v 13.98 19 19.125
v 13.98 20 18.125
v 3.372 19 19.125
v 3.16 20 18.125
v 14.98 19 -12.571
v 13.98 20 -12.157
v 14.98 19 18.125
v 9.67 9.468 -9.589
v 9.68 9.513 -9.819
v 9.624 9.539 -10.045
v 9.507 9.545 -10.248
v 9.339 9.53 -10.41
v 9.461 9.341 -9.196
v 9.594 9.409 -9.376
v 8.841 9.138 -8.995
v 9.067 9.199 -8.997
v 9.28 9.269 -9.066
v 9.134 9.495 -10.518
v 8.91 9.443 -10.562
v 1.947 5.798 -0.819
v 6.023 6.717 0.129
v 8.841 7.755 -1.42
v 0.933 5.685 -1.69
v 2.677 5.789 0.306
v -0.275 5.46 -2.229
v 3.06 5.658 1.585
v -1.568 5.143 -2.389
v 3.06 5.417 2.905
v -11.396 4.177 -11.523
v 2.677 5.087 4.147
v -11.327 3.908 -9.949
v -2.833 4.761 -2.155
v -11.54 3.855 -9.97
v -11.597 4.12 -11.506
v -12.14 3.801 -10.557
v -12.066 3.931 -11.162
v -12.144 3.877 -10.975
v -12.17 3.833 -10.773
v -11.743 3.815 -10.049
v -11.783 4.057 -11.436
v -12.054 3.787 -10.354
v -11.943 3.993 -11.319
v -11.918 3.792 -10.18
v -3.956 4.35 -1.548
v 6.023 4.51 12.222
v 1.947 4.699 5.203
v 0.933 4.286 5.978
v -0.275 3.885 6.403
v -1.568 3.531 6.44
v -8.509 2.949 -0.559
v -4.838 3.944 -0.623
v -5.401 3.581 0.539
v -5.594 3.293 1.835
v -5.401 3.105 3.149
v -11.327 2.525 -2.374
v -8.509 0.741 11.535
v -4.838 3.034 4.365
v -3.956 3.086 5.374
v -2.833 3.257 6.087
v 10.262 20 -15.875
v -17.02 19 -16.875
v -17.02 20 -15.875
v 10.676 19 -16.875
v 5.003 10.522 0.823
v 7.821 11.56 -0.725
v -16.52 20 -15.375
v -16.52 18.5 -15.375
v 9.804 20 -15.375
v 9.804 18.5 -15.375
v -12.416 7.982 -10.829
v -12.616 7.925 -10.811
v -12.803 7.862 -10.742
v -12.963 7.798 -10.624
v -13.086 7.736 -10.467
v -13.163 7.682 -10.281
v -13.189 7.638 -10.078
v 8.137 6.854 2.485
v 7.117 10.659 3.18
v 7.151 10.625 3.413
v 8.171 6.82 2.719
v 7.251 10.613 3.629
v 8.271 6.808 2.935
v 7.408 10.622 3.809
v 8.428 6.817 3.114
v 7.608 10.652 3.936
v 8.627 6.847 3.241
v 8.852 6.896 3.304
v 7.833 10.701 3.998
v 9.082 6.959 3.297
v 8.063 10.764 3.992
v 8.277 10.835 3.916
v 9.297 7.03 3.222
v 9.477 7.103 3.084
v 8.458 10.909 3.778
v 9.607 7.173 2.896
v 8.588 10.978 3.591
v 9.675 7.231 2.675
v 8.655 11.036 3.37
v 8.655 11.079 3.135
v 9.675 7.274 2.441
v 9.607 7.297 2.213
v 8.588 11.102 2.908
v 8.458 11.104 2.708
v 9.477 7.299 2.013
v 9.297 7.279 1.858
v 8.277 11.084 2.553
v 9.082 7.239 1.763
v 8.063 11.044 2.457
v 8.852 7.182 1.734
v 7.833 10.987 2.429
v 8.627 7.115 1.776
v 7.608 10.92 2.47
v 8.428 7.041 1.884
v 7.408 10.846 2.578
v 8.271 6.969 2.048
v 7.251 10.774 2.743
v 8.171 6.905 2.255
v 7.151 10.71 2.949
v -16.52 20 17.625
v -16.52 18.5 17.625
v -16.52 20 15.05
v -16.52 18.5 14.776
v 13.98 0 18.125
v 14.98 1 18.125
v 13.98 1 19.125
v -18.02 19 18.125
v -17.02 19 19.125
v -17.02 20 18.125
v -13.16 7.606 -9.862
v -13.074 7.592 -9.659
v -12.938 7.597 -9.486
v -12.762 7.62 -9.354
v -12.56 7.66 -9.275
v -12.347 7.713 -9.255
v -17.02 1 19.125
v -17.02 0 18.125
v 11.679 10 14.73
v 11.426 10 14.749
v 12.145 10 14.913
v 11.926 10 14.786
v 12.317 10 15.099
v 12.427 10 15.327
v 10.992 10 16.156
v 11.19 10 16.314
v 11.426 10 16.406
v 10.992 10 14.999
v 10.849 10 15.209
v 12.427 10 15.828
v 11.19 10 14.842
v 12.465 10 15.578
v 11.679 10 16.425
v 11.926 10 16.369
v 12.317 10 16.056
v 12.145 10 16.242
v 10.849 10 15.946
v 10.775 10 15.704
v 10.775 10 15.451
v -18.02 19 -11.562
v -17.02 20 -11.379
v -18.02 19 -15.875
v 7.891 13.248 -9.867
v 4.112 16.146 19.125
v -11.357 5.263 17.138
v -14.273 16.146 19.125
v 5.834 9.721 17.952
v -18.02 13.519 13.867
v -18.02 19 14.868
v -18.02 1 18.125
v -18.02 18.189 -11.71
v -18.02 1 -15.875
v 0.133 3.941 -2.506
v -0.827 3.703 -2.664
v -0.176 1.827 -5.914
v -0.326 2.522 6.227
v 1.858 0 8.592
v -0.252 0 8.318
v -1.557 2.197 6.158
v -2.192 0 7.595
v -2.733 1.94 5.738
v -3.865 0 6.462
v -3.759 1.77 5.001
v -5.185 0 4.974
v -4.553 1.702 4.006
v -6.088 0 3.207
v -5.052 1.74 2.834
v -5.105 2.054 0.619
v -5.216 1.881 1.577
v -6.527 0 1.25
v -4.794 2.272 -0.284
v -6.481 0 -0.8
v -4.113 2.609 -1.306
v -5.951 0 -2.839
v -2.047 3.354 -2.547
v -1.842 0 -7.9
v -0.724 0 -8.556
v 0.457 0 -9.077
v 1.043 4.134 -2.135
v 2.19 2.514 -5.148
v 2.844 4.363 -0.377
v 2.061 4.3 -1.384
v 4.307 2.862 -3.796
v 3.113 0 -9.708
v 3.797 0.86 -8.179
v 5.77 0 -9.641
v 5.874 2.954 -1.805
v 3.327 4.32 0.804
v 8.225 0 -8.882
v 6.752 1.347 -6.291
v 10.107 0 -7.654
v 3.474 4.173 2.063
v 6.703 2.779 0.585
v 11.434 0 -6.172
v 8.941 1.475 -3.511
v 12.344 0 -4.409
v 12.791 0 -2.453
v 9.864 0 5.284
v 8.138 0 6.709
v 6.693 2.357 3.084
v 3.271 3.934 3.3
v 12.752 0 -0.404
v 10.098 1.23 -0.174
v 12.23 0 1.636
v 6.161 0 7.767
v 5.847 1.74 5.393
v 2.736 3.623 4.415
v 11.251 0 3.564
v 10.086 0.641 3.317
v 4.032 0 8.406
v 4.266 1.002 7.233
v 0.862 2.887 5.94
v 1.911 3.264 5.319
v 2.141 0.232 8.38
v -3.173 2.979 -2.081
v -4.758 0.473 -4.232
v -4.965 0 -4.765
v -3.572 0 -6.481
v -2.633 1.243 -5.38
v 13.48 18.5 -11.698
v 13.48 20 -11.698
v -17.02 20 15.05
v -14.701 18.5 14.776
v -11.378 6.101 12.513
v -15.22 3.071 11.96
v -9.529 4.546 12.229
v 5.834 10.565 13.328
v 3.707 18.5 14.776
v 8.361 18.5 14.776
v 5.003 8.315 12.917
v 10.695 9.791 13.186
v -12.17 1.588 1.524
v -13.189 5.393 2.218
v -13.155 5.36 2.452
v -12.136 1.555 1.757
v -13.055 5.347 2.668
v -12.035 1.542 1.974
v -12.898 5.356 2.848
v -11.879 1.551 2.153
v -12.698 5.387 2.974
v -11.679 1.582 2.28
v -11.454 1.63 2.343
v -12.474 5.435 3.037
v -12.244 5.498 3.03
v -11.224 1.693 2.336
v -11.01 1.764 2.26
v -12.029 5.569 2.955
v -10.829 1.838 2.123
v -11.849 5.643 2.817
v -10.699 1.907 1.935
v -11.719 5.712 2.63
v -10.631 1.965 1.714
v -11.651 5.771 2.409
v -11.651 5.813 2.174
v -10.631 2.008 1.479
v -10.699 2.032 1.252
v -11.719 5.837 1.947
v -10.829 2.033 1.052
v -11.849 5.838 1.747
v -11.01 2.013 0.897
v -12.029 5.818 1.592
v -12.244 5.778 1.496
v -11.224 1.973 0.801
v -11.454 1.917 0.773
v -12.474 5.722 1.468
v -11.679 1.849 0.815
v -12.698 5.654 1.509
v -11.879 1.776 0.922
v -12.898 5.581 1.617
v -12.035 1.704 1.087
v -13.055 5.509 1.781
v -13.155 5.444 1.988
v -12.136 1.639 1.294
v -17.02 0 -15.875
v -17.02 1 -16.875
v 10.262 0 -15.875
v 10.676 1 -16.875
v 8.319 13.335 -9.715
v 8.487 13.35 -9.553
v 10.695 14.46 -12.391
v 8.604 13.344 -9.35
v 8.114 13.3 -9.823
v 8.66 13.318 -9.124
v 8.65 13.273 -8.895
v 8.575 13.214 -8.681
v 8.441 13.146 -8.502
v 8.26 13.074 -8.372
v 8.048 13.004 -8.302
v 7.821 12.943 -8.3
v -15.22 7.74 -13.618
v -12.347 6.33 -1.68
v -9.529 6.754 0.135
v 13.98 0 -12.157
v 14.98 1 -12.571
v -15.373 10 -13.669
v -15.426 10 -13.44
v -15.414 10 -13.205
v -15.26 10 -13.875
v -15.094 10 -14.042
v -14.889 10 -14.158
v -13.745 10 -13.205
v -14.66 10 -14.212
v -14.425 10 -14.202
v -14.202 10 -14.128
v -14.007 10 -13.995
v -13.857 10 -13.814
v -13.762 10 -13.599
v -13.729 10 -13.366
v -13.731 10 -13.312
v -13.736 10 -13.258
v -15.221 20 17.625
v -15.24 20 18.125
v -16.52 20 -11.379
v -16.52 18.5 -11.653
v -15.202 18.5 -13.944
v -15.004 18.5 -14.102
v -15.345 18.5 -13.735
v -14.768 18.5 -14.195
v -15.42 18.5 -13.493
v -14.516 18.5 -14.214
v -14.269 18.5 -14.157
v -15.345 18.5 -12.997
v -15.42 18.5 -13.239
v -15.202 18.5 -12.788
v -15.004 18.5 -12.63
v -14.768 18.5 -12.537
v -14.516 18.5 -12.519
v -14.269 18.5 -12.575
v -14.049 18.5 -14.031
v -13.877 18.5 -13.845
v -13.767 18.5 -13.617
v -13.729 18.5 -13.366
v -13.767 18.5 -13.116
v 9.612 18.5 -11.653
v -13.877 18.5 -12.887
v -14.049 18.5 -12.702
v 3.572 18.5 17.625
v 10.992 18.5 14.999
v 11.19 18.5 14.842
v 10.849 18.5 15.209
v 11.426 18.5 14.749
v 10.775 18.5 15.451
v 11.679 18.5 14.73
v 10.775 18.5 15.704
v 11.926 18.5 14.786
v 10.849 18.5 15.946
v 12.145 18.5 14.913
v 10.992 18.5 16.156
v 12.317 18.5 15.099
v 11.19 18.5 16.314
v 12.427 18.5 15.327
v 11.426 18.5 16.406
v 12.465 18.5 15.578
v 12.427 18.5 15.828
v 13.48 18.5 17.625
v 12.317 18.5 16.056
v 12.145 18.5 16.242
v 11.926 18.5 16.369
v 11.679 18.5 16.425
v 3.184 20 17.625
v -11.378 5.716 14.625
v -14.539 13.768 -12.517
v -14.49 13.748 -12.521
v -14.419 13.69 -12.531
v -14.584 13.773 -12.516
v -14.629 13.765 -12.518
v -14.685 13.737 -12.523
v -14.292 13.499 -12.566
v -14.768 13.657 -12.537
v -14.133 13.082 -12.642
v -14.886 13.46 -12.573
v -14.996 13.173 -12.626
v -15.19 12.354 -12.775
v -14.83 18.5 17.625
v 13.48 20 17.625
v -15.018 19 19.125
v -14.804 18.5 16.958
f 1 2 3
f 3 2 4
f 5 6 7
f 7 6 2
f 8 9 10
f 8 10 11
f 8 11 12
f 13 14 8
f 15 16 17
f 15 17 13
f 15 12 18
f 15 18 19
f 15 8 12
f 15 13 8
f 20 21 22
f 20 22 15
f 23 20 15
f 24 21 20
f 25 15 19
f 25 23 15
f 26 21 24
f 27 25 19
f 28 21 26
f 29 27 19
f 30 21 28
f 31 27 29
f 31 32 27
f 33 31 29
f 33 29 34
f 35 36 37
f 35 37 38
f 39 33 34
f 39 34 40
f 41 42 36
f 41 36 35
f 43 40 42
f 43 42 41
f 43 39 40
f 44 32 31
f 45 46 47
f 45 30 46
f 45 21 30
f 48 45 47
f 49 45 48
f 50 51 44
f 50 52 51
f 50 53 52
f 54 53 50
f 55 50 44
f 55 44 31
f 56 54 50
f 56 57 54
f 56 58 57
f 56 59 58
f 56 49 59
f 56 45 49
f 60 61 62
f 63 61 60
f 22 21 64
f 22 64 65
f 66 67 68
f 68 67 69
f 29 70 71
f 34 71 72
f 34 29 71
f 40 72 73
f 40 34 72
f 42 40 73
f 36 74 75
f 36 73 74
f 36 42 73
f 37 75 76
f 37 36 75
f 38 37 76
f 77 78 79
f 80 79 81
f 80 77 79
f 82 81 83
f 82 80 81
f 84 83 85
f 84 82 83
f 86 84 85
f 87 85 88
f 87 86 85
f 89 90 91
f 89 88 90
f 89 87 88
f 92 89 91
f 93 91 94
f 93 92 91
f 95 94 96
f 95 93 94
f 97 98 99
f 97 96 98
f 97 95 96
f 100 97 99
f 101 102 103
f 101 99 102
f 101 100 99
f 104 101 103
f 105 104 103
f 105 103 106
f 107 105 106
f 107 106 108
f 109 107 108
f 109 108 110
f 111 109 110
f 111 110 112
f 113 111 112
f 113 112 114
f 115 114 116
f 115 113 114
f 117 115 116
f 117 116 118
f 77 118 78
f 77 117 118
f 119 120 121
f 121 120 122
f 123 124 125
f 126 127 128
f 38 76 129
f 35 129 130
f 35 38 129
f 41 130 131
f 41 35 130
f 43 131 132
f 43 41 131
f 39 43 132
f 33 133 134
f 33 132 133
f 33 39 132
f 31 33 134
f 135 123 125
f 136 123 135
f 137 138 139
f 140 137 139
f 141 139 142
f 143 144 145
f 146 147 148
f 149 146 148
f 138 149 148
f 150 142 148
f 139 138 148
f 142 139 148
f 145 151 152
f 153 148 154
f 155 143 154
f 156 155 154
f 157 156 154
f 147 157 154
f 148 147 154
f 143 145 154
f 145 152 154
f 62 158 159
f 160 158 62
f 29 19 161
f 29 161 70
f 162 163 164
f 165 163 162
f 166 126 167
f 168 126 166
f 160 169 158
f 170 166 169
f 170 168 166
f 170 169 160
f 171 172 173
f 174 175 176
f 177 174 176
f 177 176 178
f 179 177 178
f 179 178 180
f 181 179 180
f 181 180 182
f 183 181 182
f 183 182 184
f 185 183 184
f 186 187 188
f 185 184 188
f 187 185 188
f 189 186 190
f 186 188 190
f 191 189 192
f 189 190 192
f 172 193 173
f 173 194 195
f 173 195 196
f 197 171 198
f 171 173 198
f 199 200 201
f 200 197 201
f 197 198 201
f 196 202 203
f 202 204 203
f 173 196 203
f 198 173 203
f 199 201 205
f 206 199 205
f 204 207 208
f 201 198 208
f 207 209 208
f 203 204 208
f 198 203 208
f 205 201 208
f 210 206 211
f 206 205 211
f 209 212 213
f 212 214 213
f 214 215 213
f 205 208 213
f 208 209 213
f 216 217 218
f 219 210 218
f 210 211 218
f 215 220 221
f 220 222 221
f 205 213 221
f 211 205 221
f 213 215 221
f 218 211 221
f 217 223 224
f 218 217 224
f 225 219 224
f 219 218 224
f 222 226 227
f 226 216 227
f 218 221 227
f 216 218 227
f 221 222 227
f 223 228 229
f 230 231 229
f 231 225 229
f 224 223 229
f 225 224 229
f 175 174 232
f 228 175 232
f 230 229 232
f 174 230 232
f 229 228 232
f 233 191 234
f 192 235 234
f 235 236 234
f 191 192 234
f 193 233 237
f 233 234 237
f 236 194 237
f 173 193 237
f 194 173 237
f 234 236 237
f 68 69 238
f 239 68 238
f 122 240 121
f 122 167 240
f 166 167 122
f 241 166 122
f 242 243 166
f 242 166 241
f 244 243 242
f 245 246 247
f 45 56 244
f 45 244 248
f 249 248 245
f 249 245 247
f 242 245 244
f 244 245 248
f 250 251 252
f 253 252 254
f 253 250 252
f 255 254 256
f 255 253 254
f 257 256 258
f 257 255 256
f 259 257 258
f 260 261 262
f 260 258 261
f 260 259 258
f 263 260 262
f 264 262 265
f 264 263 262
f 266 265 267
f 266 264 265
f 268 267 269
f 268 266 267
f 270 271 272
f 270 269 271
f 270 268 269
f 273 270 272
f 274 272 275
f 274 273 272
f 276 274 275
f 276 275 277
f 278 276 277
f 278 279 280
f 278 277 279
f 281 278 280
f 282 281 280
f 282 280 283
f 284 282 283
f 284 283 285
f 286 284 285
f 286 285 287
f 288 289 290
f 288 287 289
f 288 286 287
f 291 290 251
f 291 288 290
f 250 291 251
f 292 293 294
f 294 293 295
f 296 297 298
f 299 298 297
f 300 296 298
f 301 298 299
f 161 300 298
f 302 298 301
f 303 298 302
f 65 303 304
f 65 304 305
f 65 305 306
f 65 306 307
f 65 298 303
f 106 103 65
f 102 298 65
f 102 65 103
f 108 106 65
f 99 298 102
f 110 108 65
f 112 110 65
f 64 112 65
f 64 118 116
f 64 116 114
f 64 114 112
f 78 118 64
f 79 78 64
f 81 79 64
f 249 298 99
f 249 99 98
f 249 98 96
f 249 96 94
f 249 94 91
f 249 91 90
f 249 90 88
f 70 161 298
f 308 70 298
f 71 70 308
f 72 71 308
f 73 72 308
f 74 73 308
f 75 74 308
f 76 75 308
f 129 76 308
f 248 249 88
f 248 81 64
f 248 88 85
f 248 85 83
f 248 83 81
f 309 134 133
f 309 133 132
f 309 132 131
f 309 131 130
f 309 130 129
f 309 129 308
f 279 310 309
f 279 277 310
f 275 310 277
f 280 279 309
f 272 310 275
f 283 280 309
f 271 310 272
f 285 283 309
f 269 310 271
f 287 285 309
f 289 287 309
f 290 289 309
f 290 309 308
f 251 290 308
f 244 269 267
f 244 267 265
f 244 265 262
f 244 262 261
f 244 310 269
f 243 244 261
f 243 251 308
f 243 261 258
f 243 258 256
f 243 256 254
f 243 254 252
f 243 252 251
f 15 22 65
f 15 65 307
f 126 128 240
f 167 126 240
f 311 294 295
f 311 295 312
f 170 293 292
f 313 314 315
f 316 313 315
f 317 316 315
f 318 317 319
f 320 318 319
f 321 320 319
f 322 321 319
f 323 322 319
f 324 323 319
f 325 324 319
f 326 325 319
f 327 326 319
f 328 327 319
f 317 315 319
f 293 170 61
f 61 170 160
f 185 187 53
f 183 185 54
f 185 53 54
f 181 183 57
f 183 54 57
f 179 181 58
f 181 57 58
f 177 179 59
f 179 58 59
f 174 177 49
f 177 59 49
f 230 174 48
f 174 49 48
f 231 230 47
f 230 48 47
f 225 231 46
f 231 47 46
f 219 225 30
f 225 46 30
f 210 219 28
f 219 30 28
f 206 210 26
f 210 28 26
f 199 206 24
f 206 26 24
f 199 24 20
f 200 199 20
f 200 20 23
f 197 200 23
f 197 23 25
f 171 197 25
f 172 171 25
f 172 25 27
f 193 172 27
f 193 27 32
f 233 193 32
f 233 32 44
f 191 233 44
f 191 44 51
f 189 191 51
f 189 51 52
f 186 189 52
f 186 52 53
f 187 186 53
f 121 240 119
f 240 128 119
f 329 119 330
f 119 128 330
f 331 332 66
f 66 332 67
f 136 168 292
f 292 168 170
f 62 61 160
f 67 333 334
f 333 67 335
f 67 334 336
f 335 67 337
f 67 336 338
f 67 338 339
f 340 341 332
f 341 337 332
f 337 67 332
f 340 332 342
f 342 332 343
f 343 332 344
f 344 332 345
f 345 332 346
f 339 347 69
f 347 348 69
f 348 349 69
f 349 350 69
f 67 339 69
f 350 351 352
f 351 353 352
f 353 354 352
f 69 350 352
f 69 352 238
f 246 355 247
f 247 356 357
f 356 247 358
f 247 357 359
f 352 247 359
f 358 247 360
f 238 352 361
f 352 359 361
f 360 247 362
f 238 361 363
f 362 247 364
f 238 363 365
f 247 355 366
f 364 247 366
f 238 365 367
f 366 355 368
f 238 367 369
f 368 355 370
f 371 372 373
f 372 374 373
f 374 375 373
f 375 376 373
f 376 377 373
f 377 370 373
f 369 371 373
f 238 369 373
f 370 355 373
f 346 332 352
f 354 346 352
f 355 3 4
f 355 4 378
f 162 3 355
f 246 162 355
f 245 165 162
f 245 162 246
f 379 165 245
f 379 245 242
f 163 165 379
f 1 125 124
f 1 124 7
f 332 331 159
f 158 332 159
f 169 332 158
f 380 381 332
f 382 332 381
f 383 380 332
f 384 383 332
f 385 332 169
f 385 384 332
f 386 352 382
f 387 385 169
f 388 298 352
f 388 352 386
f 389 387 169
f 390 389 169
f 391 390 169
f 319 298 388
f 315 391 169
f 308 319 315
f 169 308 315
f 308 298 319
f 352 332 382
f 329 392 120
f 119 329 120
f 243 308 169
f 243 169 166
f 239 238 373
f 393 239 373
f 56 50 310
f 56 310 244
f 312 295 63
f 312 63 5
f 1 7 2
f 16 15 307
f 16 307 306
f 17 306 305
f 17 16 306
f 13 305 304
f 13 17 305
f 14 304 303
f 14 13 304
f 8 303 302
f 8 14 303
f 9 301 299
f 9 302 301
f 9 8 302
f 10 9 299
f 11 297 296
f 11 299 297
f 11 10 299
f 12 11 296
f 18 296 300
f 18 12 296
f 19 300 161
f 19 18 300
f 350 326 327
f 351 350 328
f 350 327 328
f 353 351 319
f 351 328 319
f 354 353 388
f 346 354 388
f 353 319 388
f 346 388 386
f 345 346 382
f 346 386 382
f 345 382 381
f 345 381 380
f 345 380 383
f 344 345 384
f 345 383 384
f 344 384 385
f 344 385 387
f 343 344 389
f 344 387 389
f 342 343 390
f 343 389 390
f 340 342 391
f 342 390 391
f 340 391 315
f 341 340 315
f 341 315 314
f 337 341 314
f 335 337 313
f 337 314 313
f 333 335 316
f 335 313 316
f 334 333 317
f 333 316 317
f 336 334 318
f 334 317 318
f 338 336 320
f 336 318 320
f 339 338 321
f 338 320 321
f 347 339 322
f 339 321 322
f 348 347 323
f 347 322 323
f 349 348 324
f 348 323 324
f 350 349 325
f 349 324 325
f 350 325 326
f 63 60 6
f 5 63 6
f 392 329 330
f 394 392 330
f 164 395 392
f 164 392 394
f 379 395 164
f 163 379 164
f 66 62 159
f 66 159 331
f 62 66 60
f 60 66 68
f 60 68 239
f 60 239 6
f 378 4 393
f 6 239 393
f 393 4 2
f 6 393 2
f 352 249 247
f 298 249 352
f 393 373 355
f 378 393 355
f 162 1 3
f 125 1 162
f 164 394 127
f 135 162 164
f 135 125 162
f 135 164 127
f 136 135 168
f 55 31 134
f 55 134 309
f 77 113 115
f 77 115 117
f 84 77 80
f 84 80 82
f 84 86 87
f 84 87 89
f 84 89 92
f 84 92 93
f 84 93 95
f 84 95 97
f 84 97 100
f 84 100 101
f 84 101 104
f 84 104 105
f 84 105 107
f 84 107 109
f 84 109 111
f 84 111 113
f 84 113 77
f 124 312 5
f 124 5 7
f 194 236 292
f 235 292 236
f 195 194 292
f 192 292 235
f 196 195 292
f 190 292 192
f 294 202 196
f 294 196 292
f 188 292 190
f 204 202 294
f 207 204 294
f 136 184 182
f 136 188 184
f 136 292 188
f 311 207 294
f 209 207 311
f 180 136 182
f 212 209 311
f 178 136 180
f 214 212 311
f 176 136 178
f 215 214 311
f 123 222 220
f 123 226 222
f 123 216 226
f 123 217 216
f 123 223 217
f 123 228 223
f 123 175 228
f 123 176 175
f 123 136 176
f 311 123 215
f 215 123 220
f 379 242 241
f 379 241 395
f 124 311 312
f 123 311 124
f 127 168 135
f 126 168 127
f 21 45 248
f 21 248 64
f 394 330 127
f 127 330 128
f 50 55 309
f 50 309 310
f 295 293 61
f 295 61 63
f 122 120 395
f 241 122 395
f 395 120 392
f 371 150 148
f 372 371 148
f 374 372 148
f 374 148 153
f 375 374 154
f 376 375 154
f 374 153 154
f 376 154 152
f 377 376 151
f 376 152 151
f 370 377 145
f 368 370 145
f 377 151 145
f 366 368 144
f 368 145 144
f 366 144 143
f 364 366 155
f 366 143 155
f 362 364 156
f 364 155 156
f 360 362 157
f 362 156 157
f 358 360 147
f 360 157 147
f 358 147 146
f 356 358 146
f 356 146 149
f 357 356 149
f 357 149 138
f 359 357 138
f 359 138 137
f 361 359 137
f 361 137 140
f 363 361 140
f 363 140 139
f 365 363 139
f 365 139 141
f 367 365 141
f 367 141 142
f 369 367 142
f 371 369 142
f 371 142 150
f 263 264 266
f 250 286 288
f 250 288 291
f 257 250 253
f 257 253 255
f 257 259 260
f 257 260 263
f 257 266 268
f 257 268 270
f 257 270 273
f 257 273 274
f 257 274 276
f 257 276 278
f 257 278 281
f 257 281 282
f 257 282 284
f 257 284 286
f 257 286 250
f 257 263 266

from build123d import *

# Parameters (mm, degrees)
F3_R      = 0.85
F4_DEPTH  = 20
F2_R      = 4.5
F5_DEPTH  = 50
F6_START  = 4
F2_R_2    = 0.8
F6_DEPTH  = 21
F7_DEPTH  = 25
F8_START  = 6
F8_DEPTH  = 19
F9_START  = 6
F9_DEPTH  = 19
F13_SIZE  = 1
F14_START = -18.5
F14_DEPTH = 6.5
F15_START = -10
F15_DEPTH = 15


with BuildPart() as f4:
    # F3 (on Front) → F4 (new body)
    with BuildSketch(Plane.XZ):
        Polygon((14.9801738807, -12.5709681619), (14.9801738807, 19.1251428629), (-18.0198261193, 19.1251428629), (-18.0198261193, -16.8748571371), (10.6762849054, -16.8748571371), align=None)
        Polygon((-16.5198261193, 17.6251428629), (13.4801738807, 17.6251428629), (13.4801738807, -11.6982692705), (9.803586014, -15.3748571371), (-16.5198261193, -15.3748571371), align=None, mode=Mode.SUBTRACT)
        Polygon((13.4801738807, -11.6982692705), (13.4801738807, 17.6251428629), (-16.5198261193, 17.6251428629), (-16.5198261193, -15.3748571371), (9.803586014, -15.3748571371), align=None)
        with Locations((-14.5791273393, -13.3661682528)):
            Circle(F3_R, mode=Mode.SUBTRACT)
        with Locations((11.6150360554, 15.5776236206)):
            Circle(F3_R, mode=Mode.SUBTRACT)
        with Locations((11.6150360554, 15.5776236206)):
            Circle(F3_R)
        with Locations((-14.5791273393, -13.3661682528)):
            Circle(F3_R)
    extrude(amount=-F4_DEPTH)

    # F2 (on line) → F5 (cut)
    with BuildSketch(Plane(origin=(-1.2431124909, 4.6393589756, 0.846901634), x_dir=(-0.9669708455, -0.2507434208, -0.0457724901), z_dir=(-0.2548870022, 0.9512512426, 0.1736481777))):
        with Locations((0, 1.2139233295)):
            Circle(F2_R)
    extrude(amount=-F5_DEPTH, mode=Mode.SUBTRACT)

    # F2 (on line) → F6 (cut)
    with BuildSketch(Plane(origin=(-1.2431124909, 4.6393589756, 0.846901634), x_dir=(-0.9669708455, -0.2507434208, -0.0457724901), z_dir=(-0.2548870022, 0.9512512426, 0.1736481777)).offset(F6_START)):
        with BuildLine():
            Line((13.4, -14.7860766705), (13.4, 11.2139233295))
            Line((13.4, 11.2139233295), (8.9, 11.2139233295))
            Line((8.9, 11.2139233295), (7.5141987763, 11.2139233295))
            Line((7.5141987763, 11.2139233295), (7.5141987763, -1.0798760923))
            Line((7.5141987763, -1.0798760923), (10.4285785928, -2.7891881764))
            Line((10.4285785928, -2.7891881764), (10.4285785928, -10.4892711845))
            ThreePointArc((10.4285785928, -10.4892711845), (11.0398439007, -10.6956797169), (11.3, -11.2860766705))
            ThreePointArc((11.3, -11.2860766705), (11.0656854249, -11.8517620955), (10.5, -12.0860766705))
            Line((10.5, -12.0860766705), (0, -12.0860766705))
            Line((0, -12.0860766705), (-10.5, -12.0860766705))
            ThreePointArc((-10.5, -12.0860766705), (-11.2992009725, -11.250330264), (-10.4285785928, -10.4892711845))
            Line((-10.4285785928, -10.4892711845), (-10.4285785928, -2.7891881764))
            Line((-10.4285785928, -2.7891881764), (-7.5141987763, -1.0798760923))
            Line((-7.5141987763, -1.0798760923), (-7.5141987763, 11.2139233295))
            Line((-7.5141987763, 11.2139233295), (-8.9, 11.2139233295))
            Line((-8.9, 11.2139233295), (-13.4, 11.2139233295))
            Line((-13.4, 11.2139233295), (-13.4, -14.7860766705))
            Line((-13.4, -14.7860766705), (13.4, -14.7860766705))
        make_face()
        with Locations((-10.5, 1.2139233295)):
            Circle(F2_R_2, mode=Mode.SUBTRACT)
        with Locations((10.5, 1.2139233295)):
            Circle(F2_R_2, mode=Mode.SUBTRACT)
        with Locations((-10.5, 1.2139233295)):
            Circle(F2_R_2)
        with Locations((10.5, 1.2139233295)):
            Circle(F2_R_2)
        with BuildLine():
            ThreePointArc((-9.7, -11.2860766705), (-9.9096030464, -10.7462327698), (-10.4285785928, -10.4892711845))
            ThreePointArc((-10.4285785928, -10.4892711845), (-11.2992009725, -11.250330264), (-10.5, -12.0860766705))
            ThreePointArc((-10.5, -12.0860766705), (-9.9343145751, -11.8517620955), (-9.7, -11.2860766705))
        make_face()
        with BuildLine():
            ThreePointArc((11.3, -11.2860766705), (11.0398439007, -10.6956797169), (10.4285785928, -10.4892711845))
            ThreePointArc((10.4285785928, -10.4892711845), (9.7007990275, -11.321823077), (10.5, -12.0860766705))
            ThreePointArc((10.5, -12.0860766705), (11.0656854249, -11.8517620955), (11.3, -11.2860766705))
        make_face()
    extrude(amount=F6_DEPTH, mode=Mode.SUBTRACT)

    # F2 (on line) → F7 (cut)
    with BuildSketch(Plane(origin=(-1.2431124909, 4.6393589756, 0.846901634), x_dir=(-0.9669708455, -0.2507434208, -0.0457724901), z_dir=(-0.2548870022, 0.9512512426, 0.1736481777))):
        with BuildLine():
            Line((7.5141987763, -1.0798760923), (7.5141987763, 11.2139233295))
            Line((7.5141987763, 11.2139233295), (-7.5141987763, 11.2139233295))
            Line((-7.5141987763, 11.2139233295), (-7.5141987763, -1.0798760923))
            Line((-7.5141987763, -1.0798760923), (-10.4285785928, -2.7891881764))
            Line((-10.4285785928, -2.7891881764), (-10.4285785928, -10.4892711845))
            ThreePointArc((-10.4285785928, -10.4892711845), (-9.9096030464, -10.7462327698), (-9.7, -11.2860766705))
            ThreePointArc((-9.7, -11.2860766705), (-9.9343145751, -11.8517620955), (-10.5, -12.0860766705))
            Line((-10.5, -12.0860766705), (0, -12.0860766705))
            Line((0, -12.0860766705), (10.5, -12.0860766705))
            ThreePointArc((10.5, -12.0860766705), (9.7007990275, -11.321823077), (10.4285785928, -10.4892711845))
            Line((10.4285785928, -10.4892711845), (10.4285785928, -2.7891881764))
            Line((10.4285785928, -2.7891881764), (7.5141987763, -1.0798760923))
        make_face()
        with Locations((0, 1.2139233295)):
            Circle(F2_R, mode=Mode.SUBTRACT)
        with Locations((0, 1.2139233295)):
            Circle(F2_R)
        with Locations((10.5, 1.2139233295)):
            Circle(F2_R_2)
        with Locations((-10.5, 1.2139233295)):
            Circle(F2_R_2)
        with BuildLine():
            ThreePointArc((-9.7, -11.2860766705), (-9.9096030464, -10.7462327698), (-10.4285785928, -10.4892711845))
            ThreePointArc((-10.4285785928, -10.4892711845), (-11.2992009725, -11.250330264), (-10.5, -12.0860766705))
            ThreePointArc((-10.5, -12.0860766705), (-9.9343145751, -11.8517620955), (-9.7, -11.2860766705))
        make_face()
        with BuildLine():
            ThreePointArc((11.3, -11.2860766705), (11.0398439007, -10.6956797169), (10.4285785928, -10.4892711845))
            ThreePointArc((10.4285785928, -10.4892711845), (9.7007990275, -11.321823077), (10.5, -12.0860766705))
            ThreePointArc((10.5, -12.0860766705), (11.0656854249, -11.8517620955), (11.3, -11.2860766705))
        make_face()
    extrude(amount=F7_DEPTH, mode=Mode.SUBTRACT)

    # F2 (on line) → F8 (cut)
    with BuildSketch(Plane(origin=(-1.2431124909, 4.6393589756, 0.846901634), x_dir=(-0.9669708455, -0.2507434208, -0.0457724901), z_dir=(-0.2548870022, 0.9512512426, 0.1736481777)).offset(F8_START)):
        Polygon((7.5141987763, 11.2139233295), (8.9, 11.2139233295), (8.9, 13.3604565635), (-8.9, 13.3604565635), (-8.9, 11.2139233295), (-7.5141987763, 11.2139233295), align=None)
    extrude(amount=F8_DEPTH, mode=Mode.SUBTRACT)

    # F2 (on line) → F9 (cut)
    with BuildSketch(Plane(origin=(-1.2431124909, 4.6393589756, 0.846901634), x_dir=(-0.9669708455, -0.2507434208, -0.0457724901), z_dir=(-0.2548870022, 0.9512512426, 0.1736481777)).offset(F9_START)):
        Polygon((-8.9, 13.3604565635), (8.9, 13.3604565635), (8.8780205697, 15.9147679806), (-8.9, 15.9147679806), align=None)
    extrude(amount=F9_DEPTH, mode=Mode.SUBTRACT)

    # F11 (on line) → F12 (revolve, cut)
    with BuildSketch(Plane(origin=(0.0191665666, 0.0050521779, 0.0009222605), x_dir=(0.2543172943, -0.967043413, 0.0122372884), z_dir=(-0.9659258263, -0.2546115422, -0.0464786045))):
        Polygon((5.9364409902, 0.3417365793), (-3.8125691497, 2.0439563921), (-4.4443800577, -1.574572133), (2.9824459925, -14.1161987558), align=None)
    revolve(axis=Axis((0.3963748827, -1.6273101694, 1.1038607146), (0.2587939631, -0.9526311498, -0.1597484808)), mode=Mode.SUBTRACT)

    # F13
    f13_edges = [f4.edges().sort_by_distance(p)[0] for p in [
        (-3.671771, 0, -16.874857),
        (12.828229, 0, -14.722913),
        (14.980174, 0, 3.277087),
        (14.980174, 20, 3.277087),
        (12.828229, 20, -14.722913),
        (-3.671771, 20, -16.874857),
        (-18.019826, 10, 19.125143),
        (-18.019826, 10, -16.874857),
        (14.980174, 10, 19.125143),
        (-1.519826, 0, 19.125143),
        (-18.019826, 0, 1.125143),
        (9.046352, 20, 19.125143),
        (-16.649363, 20, 19.125143),
        (-18.019826, 20, -14.127167),
        (-18.019826, 20, 17.08766),
    ]]
    chamfer(f13_edges, length=F13_SIZE)

    # F3 (on Front) → F14 (cut)
    with BuildSketch(Plane.XZ.offset(F14_START)):
        Polygon((13.4801738807, -11.6982692705), (13.4801738807, 17.6251428629), (-16.5198261193, 17.6251428629), (-16.5198261193, -15.3748571371), (9.803586014, -15.3748571371), align=None)
        with Locations((-14.5791273393, -13.3661682528)):
            Circle(F3_R, mode=Mode.SUBTRACT)
        with Locations((11.6150360554, 15.5776236206)):
            Circle(F3_R, mode=Mode.SUBTRACT)
    extrude(amount=-F14_DEPTH, mode=Mode.SUBTRACT)

    # F3 (on Front) → F15 (cut)
    with BuildSketch(Plane.XZ.offset(F15_START)):
        with Locations((11.6150360554, 15.5776236206)):
            Circle(F3_R)
        with Locations((-14.5791273393, -13.3661682528)):
            Circle(F3_R)
    extrude(amount=-F15_DEPTH, mode=Mode.SUBTRACT)


solid = f4.part
